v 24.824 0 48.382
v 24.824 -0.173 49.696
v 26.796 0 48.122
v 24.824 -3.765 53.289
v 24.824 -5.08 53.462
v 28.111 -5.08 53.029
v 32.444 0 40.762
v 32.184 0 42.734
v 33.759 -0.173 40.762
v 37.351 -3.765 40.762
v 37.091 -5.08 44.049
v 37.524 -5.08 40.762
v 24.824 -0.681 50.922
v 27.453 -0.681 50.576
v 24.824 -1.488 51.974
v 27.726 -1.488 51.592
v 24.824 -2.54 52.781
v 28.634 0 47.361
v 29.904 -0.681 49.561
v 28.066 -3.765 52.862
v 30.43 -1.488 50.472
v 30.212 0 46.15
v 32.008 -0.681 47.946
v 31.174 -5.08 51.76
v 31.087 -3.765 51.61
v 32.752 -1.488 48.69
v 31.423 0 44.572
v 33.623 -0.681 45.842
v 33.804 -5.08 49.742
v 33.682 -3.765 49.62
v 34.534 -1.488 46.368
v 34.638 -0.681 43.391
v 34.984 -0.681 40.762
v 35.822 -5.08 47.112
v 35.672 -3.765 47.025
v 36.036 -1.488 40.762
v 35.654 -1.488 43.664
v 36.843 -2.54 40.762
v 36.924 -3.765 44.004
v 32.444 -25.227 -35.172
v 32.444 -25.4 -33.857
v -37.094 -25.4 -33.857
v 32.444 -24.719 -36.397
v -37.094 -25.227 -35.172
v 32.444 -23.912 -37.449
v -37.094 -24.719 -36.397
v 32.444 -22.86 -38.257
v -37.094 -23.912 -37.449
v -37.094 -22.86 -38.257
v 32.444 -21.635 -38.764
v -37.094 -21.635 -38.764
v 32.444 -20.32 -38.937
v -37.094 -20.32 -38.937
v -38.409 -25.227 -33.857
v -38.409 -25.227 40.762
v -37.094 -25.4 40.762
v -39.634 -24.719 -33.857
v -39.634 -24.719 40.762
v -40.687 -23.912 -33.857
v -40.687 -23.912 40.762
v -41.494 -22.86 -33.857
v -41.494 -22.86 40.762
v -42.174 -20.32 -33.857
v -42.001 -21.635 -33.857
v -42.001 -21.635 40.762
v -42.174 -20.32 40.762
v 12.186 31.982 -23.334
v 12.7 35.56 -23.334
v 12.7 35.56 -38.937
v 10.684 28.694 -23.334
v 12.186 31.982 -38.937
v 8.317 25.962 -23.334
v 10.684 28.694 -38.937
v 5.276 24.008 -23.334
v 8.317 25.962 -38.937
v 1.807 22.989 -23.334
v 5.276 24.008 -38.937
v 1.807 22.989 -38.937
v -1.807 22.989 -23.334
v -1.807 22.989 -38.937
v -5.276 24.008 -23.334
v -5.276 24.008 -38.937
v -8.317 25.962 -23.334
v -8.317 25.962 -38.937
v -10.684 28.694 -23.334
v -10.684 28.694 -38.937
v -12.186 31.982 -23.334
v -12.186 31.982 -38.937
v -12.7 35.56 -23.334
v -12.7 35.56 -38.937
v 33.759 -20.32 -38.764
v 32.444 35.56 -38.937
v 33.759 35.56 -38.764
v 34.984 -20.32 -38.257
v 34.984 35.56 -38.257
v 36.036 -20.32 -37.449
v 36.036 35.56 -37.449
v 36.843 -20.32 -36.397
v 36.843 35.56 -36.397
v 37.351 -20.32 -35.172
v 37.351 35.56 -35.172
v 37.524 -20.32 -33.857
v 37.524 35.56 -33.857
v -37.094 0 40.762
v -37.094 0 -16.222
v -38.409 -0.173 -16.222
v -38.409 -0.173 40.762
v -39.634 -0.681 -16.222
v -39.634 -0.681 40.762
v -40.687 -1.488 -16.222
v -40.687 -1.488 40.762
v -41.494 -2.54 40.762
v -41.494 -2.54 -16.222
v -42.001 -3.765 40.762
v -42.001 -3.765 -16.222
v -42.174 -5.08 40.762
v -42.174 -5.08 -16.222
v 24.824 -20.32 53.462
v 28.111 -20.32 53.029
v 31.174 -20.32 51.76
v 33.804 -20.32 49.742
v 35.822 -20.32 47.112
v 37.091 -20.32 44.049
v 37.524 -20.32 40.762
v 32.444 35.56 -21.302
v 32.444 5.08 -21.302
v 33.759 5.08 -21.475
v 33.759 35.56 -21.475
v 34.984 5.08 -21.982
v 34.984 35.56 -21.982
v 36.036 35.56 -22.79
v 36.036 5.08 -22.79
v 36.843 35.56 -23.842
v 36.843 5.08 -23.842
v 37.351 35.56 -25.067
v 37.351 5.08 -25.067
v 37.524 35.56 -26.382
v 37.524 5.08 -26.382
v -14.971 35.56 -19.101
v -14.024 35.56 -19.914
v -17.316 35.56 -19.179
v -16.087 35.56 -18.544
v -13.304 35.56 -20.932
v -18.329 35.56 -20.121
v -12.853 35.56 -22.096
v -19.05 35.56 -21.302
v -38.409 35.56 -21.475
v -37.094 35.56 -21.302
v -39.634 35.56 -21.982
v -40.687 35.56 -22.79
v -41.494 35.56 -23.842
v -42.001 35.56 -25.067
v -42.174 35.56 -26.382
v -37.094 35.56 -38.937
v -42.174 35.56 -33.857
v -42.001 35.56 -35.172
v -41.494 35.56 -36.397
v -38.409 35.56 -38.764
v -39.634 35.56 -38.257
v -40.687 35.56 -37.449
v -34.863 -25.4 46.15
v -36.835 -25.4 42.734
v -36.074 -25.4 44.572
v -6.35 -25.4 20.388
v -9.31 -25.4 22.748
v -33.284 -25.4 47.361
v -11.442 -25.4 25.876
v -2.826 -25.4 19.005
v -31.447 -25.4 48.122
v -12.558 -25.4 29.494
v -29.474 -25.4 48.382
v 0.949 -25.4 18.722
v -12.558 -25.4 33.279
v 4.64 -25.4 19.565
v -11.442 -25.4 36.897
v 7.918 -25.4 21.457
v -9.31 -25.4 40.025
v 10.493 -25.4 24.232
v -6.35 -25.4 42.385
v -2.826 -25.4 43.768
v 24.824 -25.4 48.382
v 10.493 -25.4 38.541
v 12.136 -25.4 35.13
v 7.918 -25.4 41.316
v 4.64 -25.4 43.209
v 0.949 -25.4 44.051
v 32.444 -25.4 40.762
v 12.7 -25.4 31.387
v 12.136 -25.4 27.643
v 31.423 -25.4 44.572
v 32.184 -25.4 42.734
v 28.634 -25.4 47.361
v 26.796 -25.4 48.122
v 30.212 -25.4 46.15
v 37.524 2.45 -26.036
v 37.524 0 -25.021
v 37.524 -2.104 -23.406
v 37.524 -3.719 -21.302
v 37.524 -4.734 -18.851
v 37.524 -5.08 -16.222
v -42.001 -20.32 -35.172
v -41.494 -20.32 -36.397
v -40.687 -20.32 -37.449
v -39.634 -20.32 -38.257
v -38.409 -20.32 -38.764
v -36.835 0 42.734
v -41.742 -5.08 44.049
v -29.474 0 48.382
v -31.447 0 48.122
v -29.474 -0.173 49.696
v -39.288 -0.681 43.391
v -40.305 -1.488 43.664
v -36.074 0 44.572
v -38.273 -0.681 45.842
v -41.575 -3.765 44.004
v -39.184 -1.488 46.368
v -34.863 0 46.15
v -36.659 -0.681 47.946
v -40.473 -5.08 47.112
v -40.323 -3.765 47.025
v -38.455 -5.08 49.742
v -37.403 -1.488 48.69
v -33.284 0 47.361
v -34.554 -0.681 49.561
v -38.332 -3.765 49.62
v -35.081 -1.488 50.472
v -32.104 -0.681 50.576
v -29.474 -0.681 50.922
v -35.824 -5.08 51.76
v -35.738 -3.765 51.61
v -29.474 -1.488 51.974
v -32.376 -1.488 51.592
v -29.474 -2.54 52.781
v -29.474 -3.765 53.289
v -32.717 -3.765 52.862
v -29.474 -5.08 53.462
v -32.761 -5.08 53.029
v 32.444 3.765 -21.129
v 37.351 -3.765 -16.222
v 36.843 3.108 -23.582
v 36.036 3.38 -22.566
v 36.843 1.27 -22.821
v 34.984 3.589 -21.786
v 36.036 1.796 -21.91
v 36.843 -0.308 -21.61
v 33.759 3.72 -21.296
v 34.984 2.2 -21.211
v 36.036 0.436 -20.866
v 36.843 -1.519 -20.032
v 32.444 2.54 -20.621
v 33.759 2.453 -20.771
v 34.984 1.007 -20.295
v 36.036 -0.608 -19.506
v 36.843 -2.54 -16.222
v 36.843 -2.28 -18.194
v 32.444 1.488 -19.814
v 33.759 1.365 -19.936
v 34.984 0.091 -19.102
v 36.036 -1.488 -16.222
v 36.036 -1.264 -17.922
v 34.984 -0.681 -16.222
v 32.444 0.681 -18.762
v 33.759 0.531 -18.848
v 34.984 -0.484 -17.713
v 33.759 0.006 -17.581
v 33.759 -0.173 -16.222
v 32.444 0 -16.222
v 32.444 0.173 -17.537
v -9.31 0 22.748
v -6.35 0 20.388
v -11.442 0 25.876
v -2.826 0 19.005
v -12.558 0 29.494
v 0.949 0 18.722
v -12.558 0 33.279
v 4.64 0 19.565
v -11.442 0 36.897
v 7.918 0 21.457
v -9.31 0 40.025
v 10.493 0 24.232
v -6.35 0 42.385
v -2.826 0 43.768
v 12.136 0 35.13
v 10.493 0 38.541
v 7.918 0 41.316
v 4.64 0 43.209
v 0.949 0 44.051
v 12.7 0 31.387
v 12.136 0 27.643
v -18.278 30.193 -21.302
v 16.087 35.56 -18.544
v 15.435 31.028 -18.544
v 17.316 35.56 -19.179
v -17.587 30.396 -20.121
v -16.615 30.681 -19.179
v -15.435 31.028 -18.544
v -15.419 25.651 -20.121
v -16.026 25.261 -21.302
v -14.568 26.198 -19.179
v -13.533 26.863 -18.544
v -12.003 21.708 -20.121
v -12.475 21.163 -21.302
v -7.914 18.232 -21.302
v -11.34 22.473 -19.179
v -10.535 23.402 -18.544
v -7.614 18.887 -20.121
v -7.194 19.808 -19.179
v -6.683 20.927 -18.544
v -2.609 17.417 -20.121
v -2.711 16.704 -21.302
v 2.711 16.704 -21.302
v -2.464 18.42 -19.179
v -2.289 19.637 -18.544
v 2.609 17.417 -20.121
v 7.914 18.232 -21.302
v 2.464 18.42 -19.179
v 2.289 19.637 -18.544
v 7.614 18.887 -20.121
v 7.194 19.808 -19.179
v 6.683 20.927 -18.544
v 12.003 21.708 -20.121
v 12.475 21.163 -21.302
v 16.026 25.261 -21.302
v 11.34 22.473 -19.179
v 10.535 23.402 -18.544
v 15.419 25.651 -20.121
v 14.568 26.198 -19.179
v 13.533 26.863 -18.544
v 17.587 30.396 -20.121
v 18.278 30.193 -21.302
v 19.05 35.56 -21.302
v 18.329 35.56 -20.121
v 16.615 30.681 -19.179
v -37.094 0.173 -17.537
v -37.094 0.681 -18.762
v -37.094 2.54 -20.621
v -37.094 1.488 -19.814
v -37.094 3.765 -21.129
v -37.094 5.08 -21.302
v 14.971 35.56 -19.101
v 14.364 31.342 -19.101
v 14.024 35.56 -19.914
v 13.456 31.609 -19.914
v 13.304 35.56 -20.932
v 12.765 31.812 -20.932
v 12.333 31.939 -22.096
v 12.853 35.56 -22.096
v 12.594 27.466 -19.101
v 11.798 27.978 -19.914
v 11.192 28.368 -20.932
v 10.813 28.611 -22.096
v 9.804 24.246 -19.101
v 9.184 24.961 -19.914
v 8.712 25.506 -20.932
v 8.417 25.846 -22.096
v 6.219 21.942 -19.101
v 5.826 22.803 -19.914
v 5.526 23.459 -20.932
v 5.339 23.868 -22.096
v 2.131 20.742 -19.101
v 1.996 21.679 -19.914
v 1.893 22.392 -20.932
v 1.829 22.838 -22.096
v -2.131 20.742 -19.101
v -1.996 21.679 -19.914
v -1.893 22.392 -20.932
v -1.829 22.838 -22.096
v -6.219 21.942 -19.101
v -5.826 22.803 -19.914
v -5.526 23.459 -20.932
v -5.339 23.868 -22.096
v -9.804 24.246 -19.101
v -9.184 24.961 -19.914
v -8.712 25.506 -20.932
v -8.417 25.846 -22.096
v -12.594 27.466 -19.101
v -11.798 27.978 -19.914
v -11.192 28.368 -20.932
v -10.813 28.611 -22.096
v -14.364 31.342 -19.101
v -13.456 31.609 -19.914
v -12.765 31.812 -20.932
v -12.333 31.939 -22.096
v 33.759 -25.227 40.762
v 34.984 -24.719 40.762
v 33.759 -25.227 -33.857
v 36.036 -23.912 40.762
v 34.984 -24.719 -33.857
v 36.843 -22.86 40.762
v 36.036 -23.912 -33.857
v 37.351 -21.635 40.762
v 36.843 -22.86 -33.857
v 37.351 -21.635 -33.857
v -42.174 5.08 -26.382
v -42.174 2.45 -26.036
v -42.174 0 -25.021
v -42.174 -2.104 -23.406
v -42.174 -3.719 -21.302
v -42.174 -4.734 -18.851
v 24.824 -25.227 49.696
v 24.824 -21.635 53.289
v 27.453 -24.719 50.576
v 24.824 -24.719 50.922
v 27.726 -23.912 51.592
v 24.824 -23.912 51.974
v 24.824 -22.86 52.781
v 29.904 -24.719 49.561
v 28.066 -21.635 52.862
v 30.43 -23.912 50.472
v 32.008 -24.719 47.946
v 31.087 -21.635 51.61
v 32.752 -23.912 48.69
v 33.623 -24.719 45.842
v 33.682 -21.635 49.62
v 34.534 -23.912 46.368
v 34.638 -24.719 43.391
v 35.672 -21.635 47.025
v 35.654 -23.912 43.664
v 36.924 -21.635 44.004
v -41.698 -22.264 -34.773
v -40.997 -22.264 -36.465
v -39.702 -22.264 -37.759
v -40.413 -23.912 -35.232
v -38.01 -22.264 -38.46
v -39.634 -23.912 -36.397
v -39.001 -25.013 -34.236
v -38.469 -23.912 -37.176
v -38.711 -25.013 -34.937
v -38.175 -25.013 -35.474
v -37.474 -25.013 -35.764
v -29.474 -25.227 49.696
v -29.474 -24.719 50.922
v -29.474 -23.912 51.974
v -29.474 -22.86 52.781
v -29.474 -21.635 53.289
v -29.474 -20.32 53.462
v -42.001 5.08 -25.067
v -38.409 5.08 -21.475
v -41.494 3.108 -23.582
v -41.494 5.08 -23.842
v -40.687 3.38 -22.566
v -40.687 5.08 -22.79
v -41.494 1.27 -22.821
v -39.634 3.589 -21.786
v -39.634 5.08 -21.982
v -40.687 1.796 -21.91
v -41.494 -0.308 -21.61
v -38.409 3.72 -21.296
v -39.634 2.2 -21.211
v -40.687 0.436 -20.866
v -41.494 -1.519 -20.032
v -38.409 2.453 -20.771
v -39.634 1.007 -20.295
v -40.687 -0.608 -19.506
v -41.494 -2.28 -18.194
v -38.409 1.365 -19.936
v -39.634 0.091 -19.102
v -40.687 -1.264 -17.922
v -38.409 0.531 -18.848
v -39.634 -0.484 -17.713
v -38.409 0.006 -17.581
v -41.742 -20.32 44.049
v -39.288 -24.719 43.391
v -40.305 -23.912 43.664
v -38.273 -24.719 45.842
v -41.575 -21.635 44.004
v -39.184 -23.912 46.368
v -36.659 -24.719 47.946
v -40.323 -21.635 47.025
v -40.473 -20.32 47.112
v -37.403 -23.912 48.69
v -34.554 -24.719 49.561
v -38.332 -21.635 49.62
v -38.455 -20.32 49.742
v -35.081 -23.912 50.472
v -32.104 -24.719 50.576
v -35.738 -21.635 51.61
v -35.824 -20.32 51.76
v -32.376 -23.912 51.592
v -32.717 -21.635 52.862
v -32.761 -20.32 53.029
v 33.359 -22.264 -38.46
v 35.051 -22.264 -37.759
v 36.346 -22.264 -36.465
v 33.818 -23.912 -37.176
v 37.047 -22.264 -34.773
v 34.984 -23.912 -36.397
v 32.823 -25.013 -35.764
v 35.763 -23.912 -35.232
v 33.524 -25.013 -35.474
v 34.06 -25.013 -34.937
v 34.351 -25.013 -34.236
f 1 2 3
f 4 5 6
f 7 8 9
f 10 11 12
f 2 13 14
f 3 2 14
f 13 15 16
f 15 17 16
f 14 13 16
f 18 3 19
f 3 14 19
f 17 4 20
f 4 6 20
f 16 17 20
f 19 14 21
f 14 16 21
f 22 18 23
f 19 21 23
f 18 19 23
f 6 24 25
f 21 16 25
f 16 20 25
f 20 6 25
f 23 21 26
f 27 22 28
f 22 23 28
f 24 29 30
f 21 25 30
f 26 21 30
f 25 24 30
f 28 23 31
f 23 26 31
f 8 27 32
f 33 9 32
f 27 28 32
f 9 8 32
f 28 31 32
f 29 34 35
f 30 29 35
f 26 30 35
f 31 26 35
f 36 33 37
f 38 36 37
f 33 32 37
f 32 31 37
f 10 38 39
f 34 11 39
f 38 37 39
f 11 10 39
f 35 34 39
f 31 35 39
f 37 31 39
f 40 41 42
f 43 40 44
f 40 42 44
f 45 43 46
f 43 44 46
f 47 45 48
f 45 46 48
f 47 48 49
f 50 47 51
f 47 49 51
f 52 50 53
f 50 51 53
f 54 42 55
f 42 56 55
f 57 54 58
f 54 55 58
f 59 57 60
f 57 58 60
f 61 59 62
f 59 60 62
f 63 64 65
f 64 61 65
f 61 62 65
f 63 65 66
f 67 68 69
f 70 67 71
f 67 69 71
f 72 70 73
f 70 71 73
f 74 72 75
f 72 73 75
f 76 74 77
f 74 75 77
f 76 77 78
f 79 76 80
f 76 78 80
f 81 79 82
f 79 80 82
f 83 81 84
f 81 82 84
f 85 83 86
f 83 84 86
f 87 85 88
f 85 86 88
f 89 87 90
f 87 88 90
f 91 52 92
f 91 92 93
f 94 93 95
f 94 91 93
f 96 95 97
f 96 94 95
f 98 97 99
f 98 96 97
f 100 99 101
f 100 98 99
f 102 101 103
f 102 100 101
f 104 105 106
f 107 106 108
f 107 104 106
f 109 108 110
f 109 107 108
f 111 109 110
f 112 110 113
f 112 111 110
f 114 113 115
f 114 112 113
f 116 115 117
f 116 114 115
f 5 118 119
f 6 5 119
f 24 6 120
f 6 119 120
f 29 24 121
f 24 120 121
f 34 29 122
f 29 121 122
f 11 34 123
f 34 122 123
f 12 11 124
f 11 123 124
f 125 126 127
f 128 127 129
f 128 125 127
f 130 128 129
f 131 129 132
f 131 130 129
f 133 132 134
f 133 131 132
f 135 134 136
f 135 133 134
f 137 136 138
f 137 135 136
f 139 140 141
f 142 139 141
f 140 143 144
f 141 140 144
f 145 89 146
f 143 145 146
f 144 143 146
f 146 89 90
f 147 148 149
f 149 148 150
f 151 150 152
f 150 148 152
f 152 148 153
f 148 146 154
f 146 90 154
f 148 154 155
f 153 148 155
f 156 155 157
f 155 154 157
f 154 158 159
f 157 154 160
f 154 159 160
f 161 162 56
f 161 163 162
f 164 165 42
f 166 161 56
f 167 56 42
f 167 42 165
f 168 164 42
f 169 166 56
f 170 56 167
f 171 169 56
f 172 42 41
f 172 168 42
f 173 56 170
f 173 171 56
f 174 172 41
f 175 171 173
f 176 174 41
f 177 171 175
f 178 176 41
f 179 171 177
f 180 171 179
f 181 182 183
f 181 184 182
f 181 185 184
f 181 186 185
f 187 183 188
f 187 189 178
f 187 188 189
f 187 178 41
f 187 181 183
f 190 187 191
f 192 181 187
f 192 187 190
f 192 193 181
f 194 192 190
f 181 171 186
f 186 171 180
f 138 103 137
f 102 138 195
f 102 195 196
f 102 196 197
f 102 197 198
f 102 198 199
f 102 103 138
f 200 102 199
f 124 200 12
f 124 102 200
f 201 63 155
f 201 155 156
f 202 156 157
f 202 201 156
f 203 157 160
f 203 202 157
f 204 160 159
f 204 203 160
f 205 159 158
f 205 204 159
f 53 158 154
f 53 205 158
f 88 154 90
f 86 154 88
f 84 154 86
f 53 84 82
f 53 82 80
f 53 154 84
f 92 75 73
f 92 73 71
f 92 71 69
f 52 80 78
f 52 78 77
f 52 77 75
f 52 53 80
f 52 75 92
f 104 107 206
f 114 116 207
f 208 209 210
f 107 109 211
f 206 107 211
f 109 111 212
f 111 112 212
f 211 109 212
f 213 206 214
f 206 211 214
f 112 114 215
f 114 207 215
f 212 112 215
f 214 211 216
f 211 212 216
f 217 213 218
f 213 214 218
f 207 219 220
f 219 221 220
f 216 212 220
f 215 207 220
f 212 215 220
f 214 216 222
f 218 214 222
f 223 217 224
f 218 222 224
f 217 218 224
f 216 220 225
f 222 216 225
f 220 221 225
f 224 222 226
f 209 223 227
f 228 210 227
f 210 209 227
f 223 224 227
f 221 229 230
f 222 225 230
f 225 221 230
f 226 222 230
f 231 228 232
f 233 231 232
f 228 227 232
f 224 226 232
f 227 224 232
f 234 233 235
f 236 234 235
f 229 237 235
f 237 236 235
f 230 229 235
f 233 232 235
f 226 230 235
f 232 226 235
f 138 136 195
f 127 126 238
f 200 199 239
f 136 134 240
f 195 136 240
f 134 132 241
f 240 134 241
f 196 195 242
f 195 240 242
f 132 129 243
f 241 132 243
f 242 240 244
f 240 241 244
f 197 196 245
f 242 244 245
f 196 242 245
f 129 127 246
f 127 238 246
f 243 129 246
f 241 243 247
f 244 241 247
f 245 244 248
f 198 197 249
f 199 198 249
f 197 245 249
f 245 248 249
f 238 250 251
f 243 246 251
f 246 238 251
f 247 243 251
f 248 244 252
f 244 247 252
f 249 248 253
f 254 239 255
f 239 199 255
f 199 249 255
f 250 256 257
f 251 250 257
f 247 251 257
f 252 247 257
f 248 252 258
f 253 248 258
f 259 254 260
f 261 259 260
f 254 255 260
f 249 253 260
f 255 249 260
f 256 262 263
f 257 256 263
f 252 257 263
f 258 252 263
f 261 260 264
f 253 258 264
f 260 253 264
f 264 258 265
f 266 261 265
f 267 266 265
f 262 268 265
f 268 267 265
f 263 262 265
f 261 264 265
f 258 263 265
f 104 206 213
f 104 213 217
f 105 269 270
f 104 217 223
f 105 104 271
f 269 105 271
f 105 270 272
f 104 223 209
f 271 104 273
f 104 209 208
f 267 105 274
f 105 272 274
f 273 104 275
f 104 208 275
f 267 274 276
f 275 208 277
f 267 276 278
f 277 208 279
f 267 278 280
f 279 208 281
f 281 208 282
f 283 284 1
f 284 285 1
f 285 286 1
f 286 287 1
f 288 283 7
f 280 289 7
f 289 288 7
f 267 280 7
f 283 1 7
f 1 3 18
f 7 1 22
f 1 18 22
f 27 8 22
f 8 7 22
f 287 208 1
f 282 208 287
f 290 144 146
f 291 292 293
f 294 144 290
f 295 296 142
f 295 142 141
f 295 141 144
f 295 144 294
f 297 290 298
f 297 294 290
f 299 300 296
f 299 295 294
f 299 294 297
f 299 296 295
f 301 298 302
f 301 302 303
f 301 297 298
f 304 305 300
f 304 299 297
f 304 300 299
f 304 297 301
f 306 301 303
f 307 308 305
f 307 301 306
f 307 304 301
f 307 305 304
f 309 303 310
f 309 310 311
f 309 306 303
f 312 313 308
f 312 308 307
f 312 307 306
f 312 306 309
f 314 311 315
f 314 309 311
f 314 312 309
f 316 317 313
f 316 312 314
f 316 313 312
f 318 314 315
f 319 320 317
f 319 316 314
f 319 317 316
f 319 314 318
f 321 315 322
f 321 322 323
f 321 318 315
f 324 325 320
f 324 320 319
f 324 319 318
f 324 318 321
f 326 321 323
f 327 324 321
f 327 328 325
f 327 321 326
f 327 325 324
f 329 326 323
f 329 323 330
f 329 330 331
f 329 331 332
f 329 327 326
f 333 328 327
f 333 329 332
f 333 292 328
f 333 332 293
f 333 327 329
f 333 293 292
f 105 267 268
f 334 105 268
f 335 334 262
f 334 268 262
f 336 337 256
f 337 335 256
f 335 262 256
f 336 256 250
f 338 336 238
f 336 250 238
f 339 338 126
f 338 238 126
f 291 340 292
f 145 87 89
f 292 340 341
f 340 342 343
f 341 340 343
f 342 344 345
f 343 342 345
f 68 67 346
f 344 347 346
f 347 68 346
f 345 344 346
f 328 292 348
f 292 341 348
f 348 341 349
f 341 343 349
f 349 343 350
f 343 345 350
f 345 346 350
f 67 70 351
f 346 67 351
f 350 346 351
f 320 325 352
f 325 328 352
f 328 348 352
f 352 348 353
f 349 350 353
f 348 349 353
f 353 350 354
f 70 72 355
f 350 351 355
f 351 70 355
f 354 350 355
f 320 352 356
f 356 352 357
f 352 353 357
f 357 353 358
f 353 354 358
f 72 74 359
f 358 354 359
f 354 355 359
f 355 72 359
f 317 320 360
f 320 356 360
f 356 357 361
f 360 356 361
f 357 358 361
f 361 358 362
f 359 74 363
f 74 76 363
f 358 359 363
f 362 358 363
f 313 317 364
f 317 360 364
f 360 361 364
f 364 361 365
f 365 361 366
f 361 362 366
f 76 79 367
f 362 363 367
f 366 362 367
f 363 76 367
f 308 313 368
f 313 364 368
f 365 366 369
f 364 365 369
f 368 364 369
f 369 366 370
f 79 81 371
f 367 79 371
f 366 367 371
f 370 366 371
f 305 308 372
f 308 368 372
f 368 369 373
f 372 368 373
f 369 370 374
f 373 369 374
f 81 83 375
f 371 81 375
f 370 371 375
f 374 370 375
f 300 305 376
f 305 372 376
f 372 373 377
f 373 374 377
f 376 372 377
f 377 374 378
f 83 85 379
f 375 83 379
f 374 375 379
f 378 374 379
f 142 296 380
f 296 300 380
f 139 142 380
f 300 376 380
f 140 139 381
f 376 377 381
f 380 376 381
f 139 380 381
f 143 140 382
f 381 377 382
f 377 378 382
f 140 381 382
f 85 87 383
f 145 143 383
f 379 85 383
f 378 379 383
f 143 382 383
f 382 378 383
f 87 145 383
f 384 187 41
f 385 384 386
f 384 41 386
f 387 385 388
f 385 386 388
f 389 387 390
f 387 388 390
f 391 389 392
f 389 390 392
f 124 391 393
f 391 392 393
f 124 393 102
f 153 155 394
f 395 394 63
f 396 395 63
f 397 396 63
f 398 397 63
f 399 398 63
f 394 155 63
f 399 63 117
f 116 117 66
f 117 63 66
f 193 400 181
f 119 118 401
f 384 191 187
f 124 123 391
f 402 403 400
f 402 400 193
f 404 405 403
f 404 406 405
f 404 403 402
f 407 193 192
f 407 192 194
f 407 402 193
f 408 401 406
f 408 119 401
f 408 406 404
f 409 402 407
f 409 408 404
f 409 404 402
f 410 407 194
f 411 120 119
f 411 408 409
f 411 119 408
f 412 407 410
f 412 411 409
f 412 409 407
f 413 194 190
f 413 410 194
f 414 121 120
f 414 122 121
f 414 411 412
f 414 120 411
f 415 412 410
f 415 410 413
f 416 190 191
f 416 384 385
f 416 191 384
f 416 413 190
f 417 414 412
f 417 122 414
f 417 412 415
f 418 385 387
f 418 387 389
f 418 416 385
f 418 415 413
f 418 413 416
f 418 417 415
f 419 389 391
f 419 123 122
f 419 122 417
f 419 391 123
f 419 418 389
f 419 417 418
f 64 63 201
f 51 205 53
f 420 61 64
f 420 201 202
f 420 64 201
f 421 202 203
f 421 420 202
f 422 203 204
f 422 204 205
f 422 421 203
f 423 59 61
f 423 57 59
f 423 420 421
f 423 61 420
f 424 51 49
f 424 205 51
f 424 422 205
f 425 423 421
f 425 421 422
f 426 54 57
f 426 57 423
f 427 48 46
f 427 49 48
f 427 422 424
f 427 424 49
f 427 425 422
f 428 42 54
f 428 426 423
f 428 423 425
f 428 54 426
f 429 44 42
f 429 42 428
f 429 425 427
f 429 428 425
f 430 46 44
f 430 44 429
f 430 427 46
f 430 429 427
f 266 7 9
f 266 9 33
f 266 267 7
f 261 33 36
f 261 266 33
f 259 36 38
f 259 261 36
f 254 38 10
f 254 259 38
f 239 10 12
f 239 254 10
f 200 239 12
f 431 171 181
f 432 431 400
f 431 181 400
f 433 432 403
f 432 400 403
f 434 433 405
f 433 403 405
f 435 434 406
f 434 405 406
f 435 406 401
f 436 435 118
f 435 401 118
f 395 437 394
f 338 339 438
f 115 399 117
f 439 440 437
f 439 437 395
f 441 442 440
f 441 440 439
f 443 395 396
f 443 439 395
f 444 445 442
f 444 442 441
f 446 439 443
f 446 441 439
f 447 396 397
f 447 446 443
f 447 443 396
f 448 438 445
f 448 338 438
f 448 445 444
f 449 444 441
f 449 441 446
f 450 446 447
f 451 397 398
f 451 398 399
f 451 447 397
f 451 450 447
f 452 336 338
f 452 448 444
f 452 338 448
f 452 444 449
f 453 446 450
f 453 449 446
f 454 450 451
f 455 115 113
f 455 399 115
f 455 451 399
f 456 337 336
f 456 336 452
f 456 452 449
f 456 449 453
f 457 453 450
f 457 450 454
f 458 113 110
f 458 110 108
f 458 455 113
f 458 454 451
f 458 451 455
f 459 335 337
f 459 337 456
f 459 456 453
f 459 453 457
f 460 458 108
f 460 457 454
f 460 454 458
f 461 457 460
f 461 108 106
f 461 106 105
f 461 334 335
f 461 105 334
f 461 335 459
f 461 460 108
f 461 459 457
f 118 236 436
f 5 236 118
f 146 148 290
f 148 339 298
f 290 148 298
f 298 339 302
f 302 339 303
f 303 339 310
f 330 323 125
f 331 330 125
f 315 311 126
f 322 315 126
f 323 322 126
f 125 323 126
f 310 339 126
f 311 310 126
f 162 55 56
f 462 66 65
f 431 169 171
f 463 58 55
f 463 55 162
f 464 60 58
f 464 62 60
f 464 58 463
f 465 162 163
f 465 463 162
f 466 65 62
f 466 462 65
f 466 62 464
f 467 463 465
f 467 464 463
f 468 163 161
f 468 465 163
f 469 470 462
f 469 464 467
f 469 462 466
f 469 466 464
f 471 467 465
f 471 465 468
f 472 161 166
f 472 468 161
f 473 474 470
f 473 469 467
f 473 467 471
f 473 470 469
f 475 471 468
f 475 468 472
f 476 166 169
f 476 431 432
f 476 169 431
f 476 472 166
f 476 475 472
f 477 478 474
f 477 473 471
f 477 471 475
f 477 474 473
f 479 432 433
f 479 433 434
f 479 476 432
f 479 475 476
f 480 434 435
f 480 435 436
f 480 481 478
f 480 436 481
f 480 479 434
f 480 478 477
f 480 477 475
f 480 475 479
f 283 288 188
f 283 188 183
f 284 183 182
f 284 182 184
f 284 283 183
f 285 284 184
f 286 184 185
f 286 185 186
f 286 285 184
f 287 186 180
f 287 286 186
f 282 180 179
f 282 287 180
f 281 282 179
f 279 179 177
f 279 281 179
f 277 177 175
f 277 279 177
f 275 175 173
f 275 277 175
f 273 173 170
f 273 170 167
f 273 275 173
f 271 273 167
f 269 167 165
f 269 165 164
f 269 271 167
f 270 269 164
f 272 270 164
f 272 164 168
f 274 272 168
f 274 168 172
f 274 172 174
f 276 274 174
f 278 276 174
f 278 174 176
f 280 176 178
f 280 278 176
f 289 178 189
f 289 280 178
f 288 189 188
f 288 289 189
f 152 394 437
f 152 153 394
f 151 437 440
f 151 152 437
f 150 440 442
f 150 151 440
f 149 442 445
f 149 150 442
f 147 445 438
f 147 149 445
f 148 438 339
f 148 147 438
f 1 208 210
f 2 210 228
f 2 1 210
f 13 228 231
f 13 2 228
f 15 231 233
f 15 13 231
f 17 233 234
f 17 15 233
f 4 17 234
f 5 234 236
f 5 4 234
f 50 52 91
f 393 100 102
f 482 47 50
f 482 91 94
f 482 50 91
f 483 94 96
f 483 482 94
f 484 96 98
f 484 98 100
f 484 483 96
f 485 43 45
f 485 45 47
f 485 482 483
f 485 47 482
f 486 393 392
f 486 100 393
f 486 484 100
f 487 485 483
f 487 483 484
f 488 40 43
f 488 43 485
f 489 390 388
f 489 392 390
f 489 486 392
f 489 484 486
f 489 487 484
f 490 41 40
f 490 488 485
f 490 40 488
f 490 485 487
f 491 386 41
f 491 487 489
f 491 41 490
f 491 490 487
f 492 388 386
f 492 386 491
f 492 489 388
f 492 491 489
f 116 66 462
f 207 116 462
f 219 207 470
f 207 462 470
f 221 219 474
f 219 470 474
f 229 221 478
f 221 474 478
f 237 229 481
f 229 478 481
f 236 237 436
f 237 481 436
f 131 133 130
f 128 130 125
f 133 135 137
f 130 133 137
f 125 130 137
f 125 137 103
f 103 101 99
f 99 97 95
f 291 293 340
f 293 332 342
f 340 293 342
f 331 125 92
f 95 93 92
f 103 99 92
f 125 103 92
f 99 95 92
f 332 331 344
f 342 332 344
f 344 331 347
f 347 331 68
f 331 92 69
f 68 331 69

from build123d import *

# Parameters (mm, degrees)
F0_W         = 79.6983499915
F0_H         = 74.7635825602
F0_R         = 12.7
F0_H_2       = 17.6352638877
F1_DEPTH     = 25.4
F2_DEPTH     = 35.56
F4_DEPTH     = 17.6362638877
F5_R         = 12.7
F6_R         = 5.08
F7_T1_DEPTH  = 69.5383499915
F7_S5_W      = 5.08
F7_S5_H      = 5.08
F7_T6_DEPTH  = 5.08
F7_S11_W     = 5.08
F7_S11_H     = 5.08
F7_T12_DEPTH = 5.08
F8_DEPTH     = 3.048
F9_T2_ANGLE  = 250.1291990291
F9_T4_ANGLE  = 294.7758439205


# Not quite as in the source:
# - a fillet or chamfer that OpenCascade refuses, or shapes differently, is made with other operations: its cross-section is extruded or revolved along the edge and cut away or added


with BuildPart() as f1:
    # F0 (on Front) → F1 (new body)
    with BuildSketch(Plane.XZ):
        with Locations((-2.3253131658, 16.0799051921)):
            Rectangle(F0_W, F0_H)
        with Locations((0, 31.3866536387)):
            Circle(F0_R, mode=Mode.SUBTRACT)
        with Locations((-2.3253131658, -30.1195180319)):
            Rectangle(F0_W, F0_H_2)
    extrude(amount=F1_DEPTH)

    # F0 (on Front) → F2 (join)
    with BuildSketch(Plane.XZ):
        with Locations((-2.3253131658, -30.1195180319)):
            Rectangle(F0_W, F0_H_2)
    extrude(amount=-F2_DEPTH)

    # F3 (on face) → F4 (cut, through all)
    with BuildSketch(Plane.XY.offset(-21.3018860881)):
        with BuildLine():
            ThreePointArc((-12.7, 35.56), (0, 22.86), (12.7, 35.56))
            Line((12.7, 35.56), (-12.7, 35.56))
        make_face()
    extrude(amount=-F4_DEPTH, mode=Mode.SUBTRACT)

    # F5
    f5_edges = [f1.edges().sort_by_distance(p)[0] for p in [
        (-42.174488, -12.7, 53.461696),
        (37.523862, -12.7, 53.461696),
    ]]
    fillet(f5_edges, radius=F5_R)

    # F6
    f6_edges = [f1.edges().sort_by_distance(p)[0] for p in [
        (-2.325313, 0, 53.461696),
        (-2.325313, -25.4, 53.461696),
        (-42.174488, 0, 9.729905),
        (37.523862, 0, 9.729905),
        (-2.325313, 0, -21.301886),
        (37.523862, 17.78, -21.301886),
        (-42.174488, 17.78, -21.301886),
        (-42.174488, -25.4, 0.912273),
        (-42.174488, 5.08, -38.93715),
        (37.523862, -25.4, 0.912273),
        (37.523862, 5.08, -38.93715),
    ]]
    fillet(f6_edges, radius=F6_R)

    # F7: fillet of radius 5.08 on 1 edges, made by hand

    # F7_s2 → F7_t1 (cut)
    with BuildSketch(Plane.YZ.offset(-37.0944881615)):
        with BuildLine():
            ThreePointArc((-25.4, -33.8571499758), (-23.9121024484, -37.4492524242), (-20.32, -38.9371499758))
            Line((-20.32, -38.9371499758), (-25.4, -38.9371499758))
            Line((-25.4, -38.9371499758), (-25.4, -33.8571499758))
        make_face()
    extrude(amount=F7_T1_DEPTH, mode=Mode.SUBTRACT)


with BuildPart() as f7_tool4:
    # F7_s5 → F7_t6 (new body)
    with BuildSketch(Plane.XZ.offset(20.32)):
        with Locations((-39.6344881615, -36.3971499758)):
            Rectangle(F7_S5_W, F7_S5_H)
    extrude(amount=F7_T6_DEPTH)

    # F7_s7 → F7_t8 (revolve, cut)
    with BuildSketch(Plane(origin=(-37.0944881615, -20.32, -33.8571499758), x_dir=(0.7071067812, 0, 0.7071067812), z_dir=(0.7071067812, 0, -0.7071067812))):
        with BuildLine():
            ThreePointArc((0, -5.08), (5.08, 0), (0, 5.08))
            Line((0, 5.08), (0, -5.08))
        make_face()
    revolve(axis=Axis((-37.0944881615, -20.32, -33.8571499758), (0, -1, 0)), mode=Mode.SUBTRACT)


with BuildPart() as f1_1:
    add(f1.part)

    # F7_t3: cut F7_tool4
    add(f7_tool4.part, mode=Mode.SUBTRACT)


with BuildPart() as f7_tool10:
    # F7_s11 → F7_t12 (new body)
    with BuildSketch(Plane.XZ.offset(20.32)):
        with Locations((34.98386183, -36.3971499758)):
            Rectangle(F7_S11_W, F7_S11_H)
    extrude(amount=F7_T12_DEPTH)

    # F7_s13 → F7_t14 (revolve, cut)
    with BuildSketch(Plane(origin=(32.44386183, -20.32, -33.8571499758), x_dir=(-0.7071067812, 0, 0.7071067812), z_dir=(0.7071067812, 0, 0.7071067812))):
        with BuildLine():
            ThreePointArc((0, -5.08), (5.08, 0), (0, 5.08))
            Line((0, 5.08), (0, -5.08))
        make_face()
    revolve(axis=Axis((32.44386183, -20.32, -33.8571499758), (0, -1, 0)), mode=Mode.SUBTRACT)


with BuildPart() as f1_2:
    add(f1_1.part)

    # F7_t9: cut F7_tool10
    add(f7_tool10.part, mode=Mode.SUBTRACT)

    # F3 (on face) → F8 (join)
    with BuildSketch(Plane.XY.offset(-21.3018860881)):
        with BuildLine():
            Line((19.05, 35.56), (12.7, 35.56))
            ThreePointArc((12.7, 35.56), (0, 22.86), (-12.7, 35.56))
            Line((-12.7, 35.56), (-19.05, 35.56))
            ThreePointArc((-19.05, 35.56), (0, 16.51), (19.05, 35.56))
        make_face()
    extrude(amount=F8_DEPTH)

    # F9: fillet of radius 5.08 on 2 edges, made by hand

    # F9_s1 → F9_t2 (revolve, cut)
    with BuildSketch(Plane(origin=(16.7214049162, 23.823427639, 0), x_dir=(0, 0, 1), z_dir=(0.5744996444, 0.8185048311, 0))):
        with BuildLine():
            ThreePointArc((-21.3018860881, -39.4792073551), (-19.0836531533, -37.6057410411), (-18.2538860881, -34.823310449))
            Line((-18.2538860881, -34.823310449), (-18.2538860881, -39.4792073551))
            Line((-18.2538860881, -39.4792073551), (-21.3018860881, -39.4792073551))
        make_face()
    revolve(axis=Axis((0, 35.56, -18.2538860881), (0, 0, 1)), revolution_arc=F9_T2_ANGLE, mode=Mode.SUBTRACT)

    # F9_s3 → F9_t4 (revolve, cut)
    with BuildSketch(Plane(origin=(-16.14342639, 10.3289474307, 0), x_dir=(0, 0, 1), z_dir=(-0.8423388046, 0.5389483633, 0))):
        with BuildLine():
            ThreePointArc((-18.2538860881, 47.7335678904), (-19.7417836396, 44.141465442), (-23.3338860881, 42.6535678904))
            Line((-23.3338860881, 42.6535678904), (-18.2538860881, 42.6535678904))
            Line((-18.2538860881, 42.6535678904), (-18.2538860881, 47.7335678904))
        make_face()
    revolve(axis=Axis((0, 35.56, -18.2538860881), (0, 0, -1)), revolution_arc=F9_T4_ANGLE, mode=Mode.SUBTRACT)


solid = f1_2.part
